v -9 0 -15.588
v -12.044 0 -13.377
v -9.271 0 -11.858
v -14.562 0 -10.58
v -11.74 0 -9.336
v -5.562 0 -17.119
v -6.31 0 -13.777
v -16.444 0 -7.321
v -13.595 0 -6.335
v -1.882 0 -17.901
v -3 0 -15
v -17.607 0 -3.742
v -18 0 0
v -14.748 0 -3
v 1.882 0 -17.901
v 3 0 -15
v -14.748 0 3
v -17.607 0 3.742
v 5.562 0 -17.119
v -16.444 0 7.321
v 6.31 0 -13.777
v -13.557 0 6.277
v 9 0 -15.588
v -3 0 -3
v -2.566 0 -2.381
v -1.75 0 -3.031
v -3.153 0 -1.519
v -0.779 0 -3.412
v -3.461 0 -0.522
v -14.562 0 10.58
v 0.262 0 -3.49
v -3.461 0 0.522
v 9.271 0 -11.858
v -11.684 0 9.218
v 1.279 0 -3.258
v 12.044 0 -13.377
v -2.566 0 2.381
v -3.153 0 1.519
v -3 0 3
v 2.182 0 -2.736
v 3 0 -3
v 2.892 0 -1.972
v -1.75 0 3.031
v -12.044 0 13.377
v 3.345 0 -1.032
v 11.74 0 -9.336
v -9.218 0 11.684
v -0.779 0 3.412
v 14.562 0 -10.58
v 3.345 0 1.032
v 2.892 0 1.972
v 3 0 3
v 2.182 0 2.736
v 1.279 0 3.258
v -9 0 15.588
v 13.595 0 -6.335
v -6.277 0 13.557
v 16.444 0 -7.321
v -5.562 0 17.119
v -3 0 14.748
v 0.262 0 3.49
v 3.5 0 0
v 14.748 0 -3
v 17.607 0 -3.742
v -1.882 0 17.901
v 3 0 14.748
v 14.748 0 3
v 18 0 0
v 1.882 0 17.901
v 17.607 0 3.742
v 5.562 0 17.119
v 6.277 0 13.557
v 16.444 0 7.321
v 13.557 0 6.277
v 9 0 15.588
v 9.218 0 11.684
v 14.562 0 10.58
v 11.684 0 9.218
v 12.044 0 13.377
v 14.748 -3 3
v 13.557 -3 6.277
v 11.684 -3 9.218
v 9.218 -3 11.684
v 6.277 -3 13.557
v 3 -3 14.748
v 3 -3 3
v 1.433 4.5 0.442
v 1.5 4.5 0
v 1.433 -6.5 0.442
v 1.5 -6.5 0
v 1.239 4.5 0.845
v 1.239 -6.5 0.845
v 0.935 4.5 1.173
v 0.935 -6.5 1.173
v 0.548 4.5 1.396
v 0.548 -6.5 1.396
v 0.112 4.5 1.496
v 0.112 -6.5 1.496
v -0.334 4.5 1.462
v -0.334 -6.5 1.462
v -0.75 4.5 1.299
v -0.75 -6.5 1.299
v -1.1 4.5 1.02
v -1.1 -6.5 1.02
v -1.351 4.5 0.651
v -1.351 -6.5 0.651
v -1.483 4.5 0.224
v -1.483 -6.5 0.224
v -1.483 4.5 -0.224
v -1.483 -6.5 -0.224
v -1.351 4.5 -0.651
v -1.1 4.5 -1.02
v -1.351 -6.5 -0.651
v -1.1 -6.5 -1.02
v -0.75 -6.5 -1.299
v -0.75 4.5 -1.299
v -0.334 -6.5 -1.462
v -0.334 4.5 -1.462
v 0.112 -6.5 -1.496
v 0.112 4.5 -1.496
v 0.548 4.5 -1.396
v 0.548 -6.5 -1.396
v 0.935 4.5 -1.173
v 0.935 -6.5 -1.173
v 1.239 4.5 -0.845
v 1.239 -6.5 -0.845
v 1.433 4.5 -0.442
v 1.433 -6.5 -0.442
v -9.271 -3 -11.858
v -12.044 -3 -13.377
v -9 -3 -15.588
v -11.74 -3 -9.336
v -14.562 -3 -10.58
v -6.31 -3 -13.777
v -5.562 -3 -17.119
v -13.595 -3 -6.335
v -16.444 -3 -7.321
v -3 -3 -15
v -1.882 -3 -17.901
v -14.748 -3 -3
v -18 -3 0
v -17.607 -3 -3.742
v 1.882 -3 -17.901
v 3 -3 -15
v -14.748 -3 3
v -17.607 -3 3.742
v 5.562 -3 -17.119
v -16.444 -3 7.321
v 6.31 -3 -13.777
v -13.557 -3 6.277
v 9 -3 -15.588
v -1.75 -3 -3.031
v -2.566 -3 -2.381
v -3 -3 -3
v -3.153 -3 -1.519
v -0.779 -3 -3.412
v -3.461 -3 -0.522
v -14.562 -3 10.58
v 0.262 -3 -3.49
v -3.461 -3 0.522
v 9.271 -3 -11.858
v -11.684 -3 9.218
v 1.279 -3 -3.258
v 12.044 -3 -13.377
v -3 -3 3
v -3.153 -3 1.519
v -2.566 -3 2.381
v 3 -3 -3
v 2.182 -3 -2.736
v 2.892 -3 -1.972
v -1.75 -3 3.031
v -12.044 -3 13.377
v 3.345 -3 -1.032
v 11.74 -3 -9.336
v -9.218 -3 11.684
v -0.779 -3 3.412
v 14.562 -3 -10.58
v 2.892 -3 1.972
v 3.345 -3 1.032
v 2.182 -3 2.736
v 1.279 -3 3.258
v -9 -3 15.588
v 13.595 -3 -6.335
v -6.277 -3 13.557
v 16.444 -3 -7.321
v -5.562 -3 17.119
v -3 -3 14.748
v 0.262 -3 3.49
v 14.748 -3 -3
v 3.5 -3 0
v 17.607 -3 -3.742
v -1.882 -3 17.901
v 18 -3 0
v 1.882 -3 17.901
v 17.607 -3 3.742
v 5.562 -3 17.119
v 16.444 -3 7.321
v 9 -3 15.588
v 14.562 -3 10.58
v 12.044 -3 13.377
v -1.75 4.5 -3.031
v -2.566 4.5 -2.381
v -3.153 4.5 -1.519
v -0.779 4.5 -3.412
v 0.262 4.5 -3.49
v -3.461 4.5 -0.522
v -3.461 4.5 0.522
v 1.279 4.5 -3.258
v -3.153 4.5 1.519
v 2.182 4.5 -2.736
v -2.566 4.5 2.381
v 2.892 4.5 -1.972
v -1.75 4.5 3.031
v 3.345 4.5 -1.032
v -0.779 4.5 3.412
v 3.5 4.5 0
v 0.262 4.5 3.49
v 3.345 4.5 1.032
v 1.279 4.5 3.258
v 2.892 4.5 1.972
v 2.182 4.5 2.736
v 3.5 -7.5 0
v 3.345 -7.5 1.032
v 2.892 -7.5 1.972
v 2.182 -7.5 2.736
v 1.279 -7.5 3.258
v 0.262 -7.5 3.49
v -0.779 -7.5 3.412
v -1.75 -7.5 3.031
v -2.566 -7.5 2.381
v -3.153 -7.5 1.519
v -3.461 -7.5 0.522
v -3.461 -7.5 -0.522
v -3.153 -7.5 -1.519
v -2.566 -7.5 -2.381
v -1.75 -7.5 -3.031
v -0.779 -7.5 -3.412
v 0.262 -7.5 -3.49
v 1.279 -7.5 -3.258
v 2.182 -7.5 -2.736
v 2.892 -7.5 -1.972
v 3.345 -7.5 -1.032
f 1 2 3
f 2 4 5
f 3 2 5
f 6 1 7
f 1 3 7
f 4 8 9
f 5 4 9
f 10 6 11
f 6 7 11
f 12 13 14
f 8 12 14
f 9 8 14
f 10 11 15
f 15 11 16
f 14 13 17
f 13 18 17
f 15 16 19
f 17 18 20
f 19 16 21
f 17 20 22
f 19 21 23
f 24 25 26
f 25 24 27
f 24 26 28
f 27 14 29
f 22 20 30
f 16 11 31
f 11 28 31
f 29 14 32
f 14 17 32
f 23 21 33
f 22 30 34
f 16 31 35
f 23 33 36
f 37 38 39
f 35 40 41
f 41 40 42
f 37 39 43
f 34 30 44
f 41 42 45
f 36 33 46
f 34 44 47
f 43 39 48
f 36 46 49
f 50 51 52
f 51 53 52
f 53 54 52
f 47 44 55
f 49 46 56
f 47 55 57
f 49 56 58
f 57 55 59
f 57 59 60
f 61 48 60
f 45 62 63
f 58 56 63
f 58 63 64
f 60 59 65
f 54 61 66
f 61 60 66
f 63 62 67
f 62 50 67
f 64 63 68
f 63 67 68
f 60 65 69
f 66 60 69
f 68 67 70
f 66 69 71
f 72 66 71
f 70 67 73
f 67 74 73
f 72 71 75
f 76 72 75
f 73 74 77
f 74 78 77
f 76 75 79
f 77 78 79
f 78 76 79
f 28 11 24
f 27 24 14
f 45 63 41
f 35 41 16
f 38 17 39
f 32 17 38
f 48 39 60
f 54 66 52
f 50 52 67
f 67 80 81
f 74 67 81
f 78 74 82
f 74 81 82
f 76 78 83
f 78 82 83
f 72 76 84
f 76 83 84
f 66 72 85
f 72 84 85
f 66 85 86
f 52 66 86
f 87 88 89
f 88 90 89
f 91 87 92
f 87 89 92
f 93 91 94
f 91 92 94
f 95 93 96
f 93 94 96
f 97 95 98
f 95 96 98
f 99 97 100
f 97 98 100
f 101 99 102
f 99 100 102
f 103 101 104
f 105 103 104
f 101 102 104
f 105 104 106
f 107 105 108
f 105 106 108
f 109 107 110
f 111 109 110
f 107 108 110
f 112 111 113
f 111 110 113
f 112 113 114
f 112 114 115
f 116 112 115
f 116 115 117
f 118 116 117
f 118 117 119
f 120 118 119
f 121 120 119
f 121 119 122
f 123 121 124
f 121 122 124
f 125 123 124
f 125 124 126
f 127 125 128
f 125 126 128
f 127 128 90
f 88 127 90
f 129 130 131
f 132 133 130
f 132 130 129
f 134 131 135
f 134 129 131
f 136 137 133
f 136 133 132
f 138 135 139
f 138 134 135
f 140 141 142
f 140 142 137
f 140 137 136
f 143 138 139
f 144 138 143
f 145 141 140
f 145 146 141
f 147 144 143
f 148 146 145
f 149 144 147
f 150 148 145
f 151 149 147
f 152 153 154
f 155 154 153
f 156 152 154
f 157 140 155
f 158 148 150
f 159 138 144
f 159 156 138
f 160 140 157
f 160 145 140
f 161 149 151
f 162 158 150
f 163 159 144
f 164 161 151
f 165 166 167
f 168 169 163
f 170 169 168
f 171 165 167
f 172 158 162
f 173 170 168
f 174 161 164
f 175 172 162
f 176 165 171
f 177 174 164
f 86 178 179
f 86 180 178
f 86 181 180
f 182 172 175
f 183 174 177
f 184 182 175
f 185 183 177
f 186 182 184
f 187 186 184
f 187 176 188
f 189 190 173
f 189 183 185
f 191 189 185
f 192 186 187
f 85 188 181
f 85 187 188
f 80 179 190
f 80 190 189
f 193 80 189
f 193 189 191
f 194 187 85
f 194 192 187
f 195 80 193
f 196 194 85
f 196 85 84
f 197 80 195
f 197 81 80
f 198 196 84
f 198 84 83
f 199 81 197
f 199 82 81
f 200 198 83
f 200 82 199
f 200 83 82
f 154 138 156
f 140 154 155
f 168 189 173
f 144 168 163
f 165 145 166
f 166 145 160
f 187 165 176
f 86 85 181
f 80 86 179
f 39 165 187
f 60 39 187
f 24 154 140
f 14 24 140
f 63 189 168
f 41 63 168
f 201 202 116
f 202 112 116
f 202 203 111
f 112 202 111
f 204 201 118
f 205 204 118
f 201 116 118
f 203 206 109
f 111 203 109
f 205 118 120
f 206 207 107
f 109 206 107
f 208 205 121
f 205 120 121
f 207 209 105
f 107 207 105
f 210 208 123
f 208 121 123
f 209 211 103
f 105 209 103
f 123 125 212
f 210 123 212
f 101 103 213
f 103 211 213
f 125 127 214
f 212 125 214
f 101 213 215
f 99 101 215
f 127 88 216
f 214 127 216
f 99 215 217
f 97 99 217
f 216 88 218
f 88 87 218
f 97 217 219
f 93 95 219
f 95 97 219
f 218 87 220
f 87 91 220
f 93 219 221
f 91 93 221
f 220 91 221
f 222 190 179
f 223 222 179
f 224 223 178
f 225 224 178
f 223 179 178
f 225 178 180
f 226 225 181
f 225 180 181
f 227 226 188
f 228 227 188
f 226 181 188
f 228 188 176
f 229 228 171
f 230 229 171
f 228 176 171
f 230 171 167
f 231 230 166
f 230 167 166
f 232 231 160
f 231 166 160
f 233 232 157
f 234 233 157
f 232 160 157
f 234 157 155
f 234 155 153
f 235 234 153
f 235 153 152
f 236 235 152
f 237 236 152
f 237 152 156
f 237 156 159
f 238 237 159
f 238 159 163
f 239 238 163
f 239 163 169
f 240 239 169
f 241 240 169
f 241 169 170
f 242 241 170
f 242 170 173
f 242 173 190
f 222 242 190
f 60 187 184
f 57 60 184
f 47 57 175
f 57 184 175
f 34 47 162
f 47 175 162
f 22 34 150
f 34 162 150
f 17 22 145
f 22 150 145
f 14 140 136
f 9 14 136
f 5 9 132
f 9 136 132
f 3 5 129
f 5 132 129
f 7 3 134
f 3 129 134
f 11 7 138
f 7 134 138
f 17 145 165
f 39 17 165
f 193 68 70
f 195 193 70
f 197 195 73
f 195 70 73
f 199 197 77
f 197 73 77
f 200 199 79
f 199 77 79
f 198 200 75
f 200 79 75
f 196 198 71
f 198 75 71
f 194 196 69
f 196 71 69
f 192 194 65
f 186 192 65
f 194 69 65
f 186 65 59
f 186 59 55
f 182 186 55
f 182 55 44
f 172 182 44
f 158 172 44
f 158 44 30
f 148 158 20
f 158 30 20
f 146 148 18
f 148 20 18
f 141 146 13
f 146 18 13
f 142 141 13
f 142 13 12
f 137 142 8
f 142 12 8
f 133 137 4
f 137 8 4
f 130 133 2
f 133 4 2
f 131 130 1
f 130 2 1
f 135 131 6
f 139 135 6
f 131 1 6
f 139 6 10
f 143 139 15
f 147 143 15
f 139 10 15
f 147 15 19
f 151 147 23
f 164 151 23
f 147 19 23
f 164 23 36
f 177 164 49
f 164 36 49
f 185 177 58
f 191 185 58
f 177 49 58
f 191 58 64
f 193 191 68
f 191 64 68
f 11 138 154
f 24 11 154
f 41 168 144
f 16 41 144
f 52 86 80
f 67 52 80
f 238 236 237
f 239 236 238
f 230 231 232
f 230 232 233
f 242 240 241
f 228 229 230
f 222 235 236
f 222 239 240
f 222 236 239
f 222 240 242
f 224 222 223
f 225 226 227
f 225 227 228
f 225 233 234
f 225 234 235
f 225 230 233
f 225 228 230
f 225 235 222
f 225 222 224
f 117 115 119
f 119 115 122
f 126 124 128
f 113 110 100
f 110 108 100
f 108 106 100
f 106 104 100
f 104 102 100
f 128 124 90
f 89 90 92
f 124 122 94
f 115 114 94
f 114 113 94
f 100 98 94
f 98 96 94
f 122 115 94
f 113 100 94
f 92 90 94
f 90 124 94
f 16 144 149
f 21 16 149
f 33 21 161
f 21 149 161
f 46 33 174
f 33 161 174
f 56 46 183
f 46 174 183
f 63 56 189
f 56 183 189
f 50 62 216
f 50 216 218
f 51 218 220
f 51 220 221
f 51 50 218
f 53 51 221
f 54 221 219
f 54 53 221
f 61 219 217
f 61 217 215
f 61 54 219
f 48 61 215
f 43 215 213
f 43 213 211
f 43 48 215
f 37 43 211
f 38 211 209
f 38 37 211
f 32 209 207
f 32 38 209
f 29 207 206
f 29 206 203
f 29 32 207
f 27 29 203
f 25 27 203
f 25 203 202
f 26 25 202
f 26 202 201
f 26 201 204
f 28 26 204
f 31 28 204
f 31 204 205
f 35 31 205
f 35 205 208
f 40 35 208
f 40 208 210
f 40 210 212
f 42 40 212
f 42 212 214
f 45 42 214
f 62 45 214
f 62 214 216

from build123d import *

# Parameters (mm, degrees)
F0_R        = 18
F0_R_2      = 3.5
F1_DEPTH    = 3
F0_R_3      = 1.5
F2_DEPTH    = 7.5
F2_FACE_R   = 3.5
F2_FACE_R_2 = 1.5
F3_DEPTH    = 12
F5_DEPTH    = 250
F6_R        = 2.51997
F7_DEPTH    = 1


with BuildPart() as f1:
    # F0 (on Front) → F1 (new body)
    with BuildSketch(Plane.XZ):
        Circle(F0_R)
        Circle(F0_R_2, mode=Mode.SUBTRACT)
    extrude(amount=F1_DEPTH)

    # F0 (on Front) → F2 (join)
    with BuildSketch(Plane.XZ):
        Circle(F0_R_2)
        Circle(F0_R_3, mode=Mode.SUBTRACT)
    extrude(amount=F2_DEPTH)

    # F2_face (on face) → F3 (join)
    with BuildSketch(Plane.XZ.offset(7.5)):
        Circle(F2_FACE_R)
        Circle(F2_FACE_R_2, mode=Mode.SUBTRACT)
    extrude(amount=-F3_DEPTH)

    # F4 (on face) → F5 (cut)
    with BuildSketch(Plane.XZ.offset(3)):
        with BuildLine():
            Line((-14.748239, 3), (-3, 3))
            Line((-3, 3), (-3, 14.748239))
            ThreePointArc((-3, 14.748239), (-10.518561, 10.518561), (-14.748239, 3))
        make_face()
        with BuildLine():
            Line((3, 14.748239), (3, 3))
            Line((3, 3), (14.748239, 3))
            ThreePointArc((14.748239, 3), (10.518561, 10.518561), (3, 14.748239))
        make_face()
        with BuildLine():
            Line((-3, -15), (-3, -3))
            Line((-3, -3), (-14.748239, -3))
            ThreePointArc((-14.748239, -3), (-10.575033, -10.665228), (-3, -15))
        make_face()
        with BuildLine():
            Line((14.748239, -3), (3, -3))
            Line((3, -3), (3, -15))
            ThreePointArc((3, -15), (10.575033, -10.665228), (14.748239, -3))
        make_face()
    extrude(amount=-F5_DEPTH, mode=Mode.SUBTRACT)

    # F6 (on face) → F7 (join)
    with BuildSketch(Plane.XZ.offset(7.5)):
        Circle(F6_R)
    extrude(amount=-F7_DEPTH)


solid = f1.part
